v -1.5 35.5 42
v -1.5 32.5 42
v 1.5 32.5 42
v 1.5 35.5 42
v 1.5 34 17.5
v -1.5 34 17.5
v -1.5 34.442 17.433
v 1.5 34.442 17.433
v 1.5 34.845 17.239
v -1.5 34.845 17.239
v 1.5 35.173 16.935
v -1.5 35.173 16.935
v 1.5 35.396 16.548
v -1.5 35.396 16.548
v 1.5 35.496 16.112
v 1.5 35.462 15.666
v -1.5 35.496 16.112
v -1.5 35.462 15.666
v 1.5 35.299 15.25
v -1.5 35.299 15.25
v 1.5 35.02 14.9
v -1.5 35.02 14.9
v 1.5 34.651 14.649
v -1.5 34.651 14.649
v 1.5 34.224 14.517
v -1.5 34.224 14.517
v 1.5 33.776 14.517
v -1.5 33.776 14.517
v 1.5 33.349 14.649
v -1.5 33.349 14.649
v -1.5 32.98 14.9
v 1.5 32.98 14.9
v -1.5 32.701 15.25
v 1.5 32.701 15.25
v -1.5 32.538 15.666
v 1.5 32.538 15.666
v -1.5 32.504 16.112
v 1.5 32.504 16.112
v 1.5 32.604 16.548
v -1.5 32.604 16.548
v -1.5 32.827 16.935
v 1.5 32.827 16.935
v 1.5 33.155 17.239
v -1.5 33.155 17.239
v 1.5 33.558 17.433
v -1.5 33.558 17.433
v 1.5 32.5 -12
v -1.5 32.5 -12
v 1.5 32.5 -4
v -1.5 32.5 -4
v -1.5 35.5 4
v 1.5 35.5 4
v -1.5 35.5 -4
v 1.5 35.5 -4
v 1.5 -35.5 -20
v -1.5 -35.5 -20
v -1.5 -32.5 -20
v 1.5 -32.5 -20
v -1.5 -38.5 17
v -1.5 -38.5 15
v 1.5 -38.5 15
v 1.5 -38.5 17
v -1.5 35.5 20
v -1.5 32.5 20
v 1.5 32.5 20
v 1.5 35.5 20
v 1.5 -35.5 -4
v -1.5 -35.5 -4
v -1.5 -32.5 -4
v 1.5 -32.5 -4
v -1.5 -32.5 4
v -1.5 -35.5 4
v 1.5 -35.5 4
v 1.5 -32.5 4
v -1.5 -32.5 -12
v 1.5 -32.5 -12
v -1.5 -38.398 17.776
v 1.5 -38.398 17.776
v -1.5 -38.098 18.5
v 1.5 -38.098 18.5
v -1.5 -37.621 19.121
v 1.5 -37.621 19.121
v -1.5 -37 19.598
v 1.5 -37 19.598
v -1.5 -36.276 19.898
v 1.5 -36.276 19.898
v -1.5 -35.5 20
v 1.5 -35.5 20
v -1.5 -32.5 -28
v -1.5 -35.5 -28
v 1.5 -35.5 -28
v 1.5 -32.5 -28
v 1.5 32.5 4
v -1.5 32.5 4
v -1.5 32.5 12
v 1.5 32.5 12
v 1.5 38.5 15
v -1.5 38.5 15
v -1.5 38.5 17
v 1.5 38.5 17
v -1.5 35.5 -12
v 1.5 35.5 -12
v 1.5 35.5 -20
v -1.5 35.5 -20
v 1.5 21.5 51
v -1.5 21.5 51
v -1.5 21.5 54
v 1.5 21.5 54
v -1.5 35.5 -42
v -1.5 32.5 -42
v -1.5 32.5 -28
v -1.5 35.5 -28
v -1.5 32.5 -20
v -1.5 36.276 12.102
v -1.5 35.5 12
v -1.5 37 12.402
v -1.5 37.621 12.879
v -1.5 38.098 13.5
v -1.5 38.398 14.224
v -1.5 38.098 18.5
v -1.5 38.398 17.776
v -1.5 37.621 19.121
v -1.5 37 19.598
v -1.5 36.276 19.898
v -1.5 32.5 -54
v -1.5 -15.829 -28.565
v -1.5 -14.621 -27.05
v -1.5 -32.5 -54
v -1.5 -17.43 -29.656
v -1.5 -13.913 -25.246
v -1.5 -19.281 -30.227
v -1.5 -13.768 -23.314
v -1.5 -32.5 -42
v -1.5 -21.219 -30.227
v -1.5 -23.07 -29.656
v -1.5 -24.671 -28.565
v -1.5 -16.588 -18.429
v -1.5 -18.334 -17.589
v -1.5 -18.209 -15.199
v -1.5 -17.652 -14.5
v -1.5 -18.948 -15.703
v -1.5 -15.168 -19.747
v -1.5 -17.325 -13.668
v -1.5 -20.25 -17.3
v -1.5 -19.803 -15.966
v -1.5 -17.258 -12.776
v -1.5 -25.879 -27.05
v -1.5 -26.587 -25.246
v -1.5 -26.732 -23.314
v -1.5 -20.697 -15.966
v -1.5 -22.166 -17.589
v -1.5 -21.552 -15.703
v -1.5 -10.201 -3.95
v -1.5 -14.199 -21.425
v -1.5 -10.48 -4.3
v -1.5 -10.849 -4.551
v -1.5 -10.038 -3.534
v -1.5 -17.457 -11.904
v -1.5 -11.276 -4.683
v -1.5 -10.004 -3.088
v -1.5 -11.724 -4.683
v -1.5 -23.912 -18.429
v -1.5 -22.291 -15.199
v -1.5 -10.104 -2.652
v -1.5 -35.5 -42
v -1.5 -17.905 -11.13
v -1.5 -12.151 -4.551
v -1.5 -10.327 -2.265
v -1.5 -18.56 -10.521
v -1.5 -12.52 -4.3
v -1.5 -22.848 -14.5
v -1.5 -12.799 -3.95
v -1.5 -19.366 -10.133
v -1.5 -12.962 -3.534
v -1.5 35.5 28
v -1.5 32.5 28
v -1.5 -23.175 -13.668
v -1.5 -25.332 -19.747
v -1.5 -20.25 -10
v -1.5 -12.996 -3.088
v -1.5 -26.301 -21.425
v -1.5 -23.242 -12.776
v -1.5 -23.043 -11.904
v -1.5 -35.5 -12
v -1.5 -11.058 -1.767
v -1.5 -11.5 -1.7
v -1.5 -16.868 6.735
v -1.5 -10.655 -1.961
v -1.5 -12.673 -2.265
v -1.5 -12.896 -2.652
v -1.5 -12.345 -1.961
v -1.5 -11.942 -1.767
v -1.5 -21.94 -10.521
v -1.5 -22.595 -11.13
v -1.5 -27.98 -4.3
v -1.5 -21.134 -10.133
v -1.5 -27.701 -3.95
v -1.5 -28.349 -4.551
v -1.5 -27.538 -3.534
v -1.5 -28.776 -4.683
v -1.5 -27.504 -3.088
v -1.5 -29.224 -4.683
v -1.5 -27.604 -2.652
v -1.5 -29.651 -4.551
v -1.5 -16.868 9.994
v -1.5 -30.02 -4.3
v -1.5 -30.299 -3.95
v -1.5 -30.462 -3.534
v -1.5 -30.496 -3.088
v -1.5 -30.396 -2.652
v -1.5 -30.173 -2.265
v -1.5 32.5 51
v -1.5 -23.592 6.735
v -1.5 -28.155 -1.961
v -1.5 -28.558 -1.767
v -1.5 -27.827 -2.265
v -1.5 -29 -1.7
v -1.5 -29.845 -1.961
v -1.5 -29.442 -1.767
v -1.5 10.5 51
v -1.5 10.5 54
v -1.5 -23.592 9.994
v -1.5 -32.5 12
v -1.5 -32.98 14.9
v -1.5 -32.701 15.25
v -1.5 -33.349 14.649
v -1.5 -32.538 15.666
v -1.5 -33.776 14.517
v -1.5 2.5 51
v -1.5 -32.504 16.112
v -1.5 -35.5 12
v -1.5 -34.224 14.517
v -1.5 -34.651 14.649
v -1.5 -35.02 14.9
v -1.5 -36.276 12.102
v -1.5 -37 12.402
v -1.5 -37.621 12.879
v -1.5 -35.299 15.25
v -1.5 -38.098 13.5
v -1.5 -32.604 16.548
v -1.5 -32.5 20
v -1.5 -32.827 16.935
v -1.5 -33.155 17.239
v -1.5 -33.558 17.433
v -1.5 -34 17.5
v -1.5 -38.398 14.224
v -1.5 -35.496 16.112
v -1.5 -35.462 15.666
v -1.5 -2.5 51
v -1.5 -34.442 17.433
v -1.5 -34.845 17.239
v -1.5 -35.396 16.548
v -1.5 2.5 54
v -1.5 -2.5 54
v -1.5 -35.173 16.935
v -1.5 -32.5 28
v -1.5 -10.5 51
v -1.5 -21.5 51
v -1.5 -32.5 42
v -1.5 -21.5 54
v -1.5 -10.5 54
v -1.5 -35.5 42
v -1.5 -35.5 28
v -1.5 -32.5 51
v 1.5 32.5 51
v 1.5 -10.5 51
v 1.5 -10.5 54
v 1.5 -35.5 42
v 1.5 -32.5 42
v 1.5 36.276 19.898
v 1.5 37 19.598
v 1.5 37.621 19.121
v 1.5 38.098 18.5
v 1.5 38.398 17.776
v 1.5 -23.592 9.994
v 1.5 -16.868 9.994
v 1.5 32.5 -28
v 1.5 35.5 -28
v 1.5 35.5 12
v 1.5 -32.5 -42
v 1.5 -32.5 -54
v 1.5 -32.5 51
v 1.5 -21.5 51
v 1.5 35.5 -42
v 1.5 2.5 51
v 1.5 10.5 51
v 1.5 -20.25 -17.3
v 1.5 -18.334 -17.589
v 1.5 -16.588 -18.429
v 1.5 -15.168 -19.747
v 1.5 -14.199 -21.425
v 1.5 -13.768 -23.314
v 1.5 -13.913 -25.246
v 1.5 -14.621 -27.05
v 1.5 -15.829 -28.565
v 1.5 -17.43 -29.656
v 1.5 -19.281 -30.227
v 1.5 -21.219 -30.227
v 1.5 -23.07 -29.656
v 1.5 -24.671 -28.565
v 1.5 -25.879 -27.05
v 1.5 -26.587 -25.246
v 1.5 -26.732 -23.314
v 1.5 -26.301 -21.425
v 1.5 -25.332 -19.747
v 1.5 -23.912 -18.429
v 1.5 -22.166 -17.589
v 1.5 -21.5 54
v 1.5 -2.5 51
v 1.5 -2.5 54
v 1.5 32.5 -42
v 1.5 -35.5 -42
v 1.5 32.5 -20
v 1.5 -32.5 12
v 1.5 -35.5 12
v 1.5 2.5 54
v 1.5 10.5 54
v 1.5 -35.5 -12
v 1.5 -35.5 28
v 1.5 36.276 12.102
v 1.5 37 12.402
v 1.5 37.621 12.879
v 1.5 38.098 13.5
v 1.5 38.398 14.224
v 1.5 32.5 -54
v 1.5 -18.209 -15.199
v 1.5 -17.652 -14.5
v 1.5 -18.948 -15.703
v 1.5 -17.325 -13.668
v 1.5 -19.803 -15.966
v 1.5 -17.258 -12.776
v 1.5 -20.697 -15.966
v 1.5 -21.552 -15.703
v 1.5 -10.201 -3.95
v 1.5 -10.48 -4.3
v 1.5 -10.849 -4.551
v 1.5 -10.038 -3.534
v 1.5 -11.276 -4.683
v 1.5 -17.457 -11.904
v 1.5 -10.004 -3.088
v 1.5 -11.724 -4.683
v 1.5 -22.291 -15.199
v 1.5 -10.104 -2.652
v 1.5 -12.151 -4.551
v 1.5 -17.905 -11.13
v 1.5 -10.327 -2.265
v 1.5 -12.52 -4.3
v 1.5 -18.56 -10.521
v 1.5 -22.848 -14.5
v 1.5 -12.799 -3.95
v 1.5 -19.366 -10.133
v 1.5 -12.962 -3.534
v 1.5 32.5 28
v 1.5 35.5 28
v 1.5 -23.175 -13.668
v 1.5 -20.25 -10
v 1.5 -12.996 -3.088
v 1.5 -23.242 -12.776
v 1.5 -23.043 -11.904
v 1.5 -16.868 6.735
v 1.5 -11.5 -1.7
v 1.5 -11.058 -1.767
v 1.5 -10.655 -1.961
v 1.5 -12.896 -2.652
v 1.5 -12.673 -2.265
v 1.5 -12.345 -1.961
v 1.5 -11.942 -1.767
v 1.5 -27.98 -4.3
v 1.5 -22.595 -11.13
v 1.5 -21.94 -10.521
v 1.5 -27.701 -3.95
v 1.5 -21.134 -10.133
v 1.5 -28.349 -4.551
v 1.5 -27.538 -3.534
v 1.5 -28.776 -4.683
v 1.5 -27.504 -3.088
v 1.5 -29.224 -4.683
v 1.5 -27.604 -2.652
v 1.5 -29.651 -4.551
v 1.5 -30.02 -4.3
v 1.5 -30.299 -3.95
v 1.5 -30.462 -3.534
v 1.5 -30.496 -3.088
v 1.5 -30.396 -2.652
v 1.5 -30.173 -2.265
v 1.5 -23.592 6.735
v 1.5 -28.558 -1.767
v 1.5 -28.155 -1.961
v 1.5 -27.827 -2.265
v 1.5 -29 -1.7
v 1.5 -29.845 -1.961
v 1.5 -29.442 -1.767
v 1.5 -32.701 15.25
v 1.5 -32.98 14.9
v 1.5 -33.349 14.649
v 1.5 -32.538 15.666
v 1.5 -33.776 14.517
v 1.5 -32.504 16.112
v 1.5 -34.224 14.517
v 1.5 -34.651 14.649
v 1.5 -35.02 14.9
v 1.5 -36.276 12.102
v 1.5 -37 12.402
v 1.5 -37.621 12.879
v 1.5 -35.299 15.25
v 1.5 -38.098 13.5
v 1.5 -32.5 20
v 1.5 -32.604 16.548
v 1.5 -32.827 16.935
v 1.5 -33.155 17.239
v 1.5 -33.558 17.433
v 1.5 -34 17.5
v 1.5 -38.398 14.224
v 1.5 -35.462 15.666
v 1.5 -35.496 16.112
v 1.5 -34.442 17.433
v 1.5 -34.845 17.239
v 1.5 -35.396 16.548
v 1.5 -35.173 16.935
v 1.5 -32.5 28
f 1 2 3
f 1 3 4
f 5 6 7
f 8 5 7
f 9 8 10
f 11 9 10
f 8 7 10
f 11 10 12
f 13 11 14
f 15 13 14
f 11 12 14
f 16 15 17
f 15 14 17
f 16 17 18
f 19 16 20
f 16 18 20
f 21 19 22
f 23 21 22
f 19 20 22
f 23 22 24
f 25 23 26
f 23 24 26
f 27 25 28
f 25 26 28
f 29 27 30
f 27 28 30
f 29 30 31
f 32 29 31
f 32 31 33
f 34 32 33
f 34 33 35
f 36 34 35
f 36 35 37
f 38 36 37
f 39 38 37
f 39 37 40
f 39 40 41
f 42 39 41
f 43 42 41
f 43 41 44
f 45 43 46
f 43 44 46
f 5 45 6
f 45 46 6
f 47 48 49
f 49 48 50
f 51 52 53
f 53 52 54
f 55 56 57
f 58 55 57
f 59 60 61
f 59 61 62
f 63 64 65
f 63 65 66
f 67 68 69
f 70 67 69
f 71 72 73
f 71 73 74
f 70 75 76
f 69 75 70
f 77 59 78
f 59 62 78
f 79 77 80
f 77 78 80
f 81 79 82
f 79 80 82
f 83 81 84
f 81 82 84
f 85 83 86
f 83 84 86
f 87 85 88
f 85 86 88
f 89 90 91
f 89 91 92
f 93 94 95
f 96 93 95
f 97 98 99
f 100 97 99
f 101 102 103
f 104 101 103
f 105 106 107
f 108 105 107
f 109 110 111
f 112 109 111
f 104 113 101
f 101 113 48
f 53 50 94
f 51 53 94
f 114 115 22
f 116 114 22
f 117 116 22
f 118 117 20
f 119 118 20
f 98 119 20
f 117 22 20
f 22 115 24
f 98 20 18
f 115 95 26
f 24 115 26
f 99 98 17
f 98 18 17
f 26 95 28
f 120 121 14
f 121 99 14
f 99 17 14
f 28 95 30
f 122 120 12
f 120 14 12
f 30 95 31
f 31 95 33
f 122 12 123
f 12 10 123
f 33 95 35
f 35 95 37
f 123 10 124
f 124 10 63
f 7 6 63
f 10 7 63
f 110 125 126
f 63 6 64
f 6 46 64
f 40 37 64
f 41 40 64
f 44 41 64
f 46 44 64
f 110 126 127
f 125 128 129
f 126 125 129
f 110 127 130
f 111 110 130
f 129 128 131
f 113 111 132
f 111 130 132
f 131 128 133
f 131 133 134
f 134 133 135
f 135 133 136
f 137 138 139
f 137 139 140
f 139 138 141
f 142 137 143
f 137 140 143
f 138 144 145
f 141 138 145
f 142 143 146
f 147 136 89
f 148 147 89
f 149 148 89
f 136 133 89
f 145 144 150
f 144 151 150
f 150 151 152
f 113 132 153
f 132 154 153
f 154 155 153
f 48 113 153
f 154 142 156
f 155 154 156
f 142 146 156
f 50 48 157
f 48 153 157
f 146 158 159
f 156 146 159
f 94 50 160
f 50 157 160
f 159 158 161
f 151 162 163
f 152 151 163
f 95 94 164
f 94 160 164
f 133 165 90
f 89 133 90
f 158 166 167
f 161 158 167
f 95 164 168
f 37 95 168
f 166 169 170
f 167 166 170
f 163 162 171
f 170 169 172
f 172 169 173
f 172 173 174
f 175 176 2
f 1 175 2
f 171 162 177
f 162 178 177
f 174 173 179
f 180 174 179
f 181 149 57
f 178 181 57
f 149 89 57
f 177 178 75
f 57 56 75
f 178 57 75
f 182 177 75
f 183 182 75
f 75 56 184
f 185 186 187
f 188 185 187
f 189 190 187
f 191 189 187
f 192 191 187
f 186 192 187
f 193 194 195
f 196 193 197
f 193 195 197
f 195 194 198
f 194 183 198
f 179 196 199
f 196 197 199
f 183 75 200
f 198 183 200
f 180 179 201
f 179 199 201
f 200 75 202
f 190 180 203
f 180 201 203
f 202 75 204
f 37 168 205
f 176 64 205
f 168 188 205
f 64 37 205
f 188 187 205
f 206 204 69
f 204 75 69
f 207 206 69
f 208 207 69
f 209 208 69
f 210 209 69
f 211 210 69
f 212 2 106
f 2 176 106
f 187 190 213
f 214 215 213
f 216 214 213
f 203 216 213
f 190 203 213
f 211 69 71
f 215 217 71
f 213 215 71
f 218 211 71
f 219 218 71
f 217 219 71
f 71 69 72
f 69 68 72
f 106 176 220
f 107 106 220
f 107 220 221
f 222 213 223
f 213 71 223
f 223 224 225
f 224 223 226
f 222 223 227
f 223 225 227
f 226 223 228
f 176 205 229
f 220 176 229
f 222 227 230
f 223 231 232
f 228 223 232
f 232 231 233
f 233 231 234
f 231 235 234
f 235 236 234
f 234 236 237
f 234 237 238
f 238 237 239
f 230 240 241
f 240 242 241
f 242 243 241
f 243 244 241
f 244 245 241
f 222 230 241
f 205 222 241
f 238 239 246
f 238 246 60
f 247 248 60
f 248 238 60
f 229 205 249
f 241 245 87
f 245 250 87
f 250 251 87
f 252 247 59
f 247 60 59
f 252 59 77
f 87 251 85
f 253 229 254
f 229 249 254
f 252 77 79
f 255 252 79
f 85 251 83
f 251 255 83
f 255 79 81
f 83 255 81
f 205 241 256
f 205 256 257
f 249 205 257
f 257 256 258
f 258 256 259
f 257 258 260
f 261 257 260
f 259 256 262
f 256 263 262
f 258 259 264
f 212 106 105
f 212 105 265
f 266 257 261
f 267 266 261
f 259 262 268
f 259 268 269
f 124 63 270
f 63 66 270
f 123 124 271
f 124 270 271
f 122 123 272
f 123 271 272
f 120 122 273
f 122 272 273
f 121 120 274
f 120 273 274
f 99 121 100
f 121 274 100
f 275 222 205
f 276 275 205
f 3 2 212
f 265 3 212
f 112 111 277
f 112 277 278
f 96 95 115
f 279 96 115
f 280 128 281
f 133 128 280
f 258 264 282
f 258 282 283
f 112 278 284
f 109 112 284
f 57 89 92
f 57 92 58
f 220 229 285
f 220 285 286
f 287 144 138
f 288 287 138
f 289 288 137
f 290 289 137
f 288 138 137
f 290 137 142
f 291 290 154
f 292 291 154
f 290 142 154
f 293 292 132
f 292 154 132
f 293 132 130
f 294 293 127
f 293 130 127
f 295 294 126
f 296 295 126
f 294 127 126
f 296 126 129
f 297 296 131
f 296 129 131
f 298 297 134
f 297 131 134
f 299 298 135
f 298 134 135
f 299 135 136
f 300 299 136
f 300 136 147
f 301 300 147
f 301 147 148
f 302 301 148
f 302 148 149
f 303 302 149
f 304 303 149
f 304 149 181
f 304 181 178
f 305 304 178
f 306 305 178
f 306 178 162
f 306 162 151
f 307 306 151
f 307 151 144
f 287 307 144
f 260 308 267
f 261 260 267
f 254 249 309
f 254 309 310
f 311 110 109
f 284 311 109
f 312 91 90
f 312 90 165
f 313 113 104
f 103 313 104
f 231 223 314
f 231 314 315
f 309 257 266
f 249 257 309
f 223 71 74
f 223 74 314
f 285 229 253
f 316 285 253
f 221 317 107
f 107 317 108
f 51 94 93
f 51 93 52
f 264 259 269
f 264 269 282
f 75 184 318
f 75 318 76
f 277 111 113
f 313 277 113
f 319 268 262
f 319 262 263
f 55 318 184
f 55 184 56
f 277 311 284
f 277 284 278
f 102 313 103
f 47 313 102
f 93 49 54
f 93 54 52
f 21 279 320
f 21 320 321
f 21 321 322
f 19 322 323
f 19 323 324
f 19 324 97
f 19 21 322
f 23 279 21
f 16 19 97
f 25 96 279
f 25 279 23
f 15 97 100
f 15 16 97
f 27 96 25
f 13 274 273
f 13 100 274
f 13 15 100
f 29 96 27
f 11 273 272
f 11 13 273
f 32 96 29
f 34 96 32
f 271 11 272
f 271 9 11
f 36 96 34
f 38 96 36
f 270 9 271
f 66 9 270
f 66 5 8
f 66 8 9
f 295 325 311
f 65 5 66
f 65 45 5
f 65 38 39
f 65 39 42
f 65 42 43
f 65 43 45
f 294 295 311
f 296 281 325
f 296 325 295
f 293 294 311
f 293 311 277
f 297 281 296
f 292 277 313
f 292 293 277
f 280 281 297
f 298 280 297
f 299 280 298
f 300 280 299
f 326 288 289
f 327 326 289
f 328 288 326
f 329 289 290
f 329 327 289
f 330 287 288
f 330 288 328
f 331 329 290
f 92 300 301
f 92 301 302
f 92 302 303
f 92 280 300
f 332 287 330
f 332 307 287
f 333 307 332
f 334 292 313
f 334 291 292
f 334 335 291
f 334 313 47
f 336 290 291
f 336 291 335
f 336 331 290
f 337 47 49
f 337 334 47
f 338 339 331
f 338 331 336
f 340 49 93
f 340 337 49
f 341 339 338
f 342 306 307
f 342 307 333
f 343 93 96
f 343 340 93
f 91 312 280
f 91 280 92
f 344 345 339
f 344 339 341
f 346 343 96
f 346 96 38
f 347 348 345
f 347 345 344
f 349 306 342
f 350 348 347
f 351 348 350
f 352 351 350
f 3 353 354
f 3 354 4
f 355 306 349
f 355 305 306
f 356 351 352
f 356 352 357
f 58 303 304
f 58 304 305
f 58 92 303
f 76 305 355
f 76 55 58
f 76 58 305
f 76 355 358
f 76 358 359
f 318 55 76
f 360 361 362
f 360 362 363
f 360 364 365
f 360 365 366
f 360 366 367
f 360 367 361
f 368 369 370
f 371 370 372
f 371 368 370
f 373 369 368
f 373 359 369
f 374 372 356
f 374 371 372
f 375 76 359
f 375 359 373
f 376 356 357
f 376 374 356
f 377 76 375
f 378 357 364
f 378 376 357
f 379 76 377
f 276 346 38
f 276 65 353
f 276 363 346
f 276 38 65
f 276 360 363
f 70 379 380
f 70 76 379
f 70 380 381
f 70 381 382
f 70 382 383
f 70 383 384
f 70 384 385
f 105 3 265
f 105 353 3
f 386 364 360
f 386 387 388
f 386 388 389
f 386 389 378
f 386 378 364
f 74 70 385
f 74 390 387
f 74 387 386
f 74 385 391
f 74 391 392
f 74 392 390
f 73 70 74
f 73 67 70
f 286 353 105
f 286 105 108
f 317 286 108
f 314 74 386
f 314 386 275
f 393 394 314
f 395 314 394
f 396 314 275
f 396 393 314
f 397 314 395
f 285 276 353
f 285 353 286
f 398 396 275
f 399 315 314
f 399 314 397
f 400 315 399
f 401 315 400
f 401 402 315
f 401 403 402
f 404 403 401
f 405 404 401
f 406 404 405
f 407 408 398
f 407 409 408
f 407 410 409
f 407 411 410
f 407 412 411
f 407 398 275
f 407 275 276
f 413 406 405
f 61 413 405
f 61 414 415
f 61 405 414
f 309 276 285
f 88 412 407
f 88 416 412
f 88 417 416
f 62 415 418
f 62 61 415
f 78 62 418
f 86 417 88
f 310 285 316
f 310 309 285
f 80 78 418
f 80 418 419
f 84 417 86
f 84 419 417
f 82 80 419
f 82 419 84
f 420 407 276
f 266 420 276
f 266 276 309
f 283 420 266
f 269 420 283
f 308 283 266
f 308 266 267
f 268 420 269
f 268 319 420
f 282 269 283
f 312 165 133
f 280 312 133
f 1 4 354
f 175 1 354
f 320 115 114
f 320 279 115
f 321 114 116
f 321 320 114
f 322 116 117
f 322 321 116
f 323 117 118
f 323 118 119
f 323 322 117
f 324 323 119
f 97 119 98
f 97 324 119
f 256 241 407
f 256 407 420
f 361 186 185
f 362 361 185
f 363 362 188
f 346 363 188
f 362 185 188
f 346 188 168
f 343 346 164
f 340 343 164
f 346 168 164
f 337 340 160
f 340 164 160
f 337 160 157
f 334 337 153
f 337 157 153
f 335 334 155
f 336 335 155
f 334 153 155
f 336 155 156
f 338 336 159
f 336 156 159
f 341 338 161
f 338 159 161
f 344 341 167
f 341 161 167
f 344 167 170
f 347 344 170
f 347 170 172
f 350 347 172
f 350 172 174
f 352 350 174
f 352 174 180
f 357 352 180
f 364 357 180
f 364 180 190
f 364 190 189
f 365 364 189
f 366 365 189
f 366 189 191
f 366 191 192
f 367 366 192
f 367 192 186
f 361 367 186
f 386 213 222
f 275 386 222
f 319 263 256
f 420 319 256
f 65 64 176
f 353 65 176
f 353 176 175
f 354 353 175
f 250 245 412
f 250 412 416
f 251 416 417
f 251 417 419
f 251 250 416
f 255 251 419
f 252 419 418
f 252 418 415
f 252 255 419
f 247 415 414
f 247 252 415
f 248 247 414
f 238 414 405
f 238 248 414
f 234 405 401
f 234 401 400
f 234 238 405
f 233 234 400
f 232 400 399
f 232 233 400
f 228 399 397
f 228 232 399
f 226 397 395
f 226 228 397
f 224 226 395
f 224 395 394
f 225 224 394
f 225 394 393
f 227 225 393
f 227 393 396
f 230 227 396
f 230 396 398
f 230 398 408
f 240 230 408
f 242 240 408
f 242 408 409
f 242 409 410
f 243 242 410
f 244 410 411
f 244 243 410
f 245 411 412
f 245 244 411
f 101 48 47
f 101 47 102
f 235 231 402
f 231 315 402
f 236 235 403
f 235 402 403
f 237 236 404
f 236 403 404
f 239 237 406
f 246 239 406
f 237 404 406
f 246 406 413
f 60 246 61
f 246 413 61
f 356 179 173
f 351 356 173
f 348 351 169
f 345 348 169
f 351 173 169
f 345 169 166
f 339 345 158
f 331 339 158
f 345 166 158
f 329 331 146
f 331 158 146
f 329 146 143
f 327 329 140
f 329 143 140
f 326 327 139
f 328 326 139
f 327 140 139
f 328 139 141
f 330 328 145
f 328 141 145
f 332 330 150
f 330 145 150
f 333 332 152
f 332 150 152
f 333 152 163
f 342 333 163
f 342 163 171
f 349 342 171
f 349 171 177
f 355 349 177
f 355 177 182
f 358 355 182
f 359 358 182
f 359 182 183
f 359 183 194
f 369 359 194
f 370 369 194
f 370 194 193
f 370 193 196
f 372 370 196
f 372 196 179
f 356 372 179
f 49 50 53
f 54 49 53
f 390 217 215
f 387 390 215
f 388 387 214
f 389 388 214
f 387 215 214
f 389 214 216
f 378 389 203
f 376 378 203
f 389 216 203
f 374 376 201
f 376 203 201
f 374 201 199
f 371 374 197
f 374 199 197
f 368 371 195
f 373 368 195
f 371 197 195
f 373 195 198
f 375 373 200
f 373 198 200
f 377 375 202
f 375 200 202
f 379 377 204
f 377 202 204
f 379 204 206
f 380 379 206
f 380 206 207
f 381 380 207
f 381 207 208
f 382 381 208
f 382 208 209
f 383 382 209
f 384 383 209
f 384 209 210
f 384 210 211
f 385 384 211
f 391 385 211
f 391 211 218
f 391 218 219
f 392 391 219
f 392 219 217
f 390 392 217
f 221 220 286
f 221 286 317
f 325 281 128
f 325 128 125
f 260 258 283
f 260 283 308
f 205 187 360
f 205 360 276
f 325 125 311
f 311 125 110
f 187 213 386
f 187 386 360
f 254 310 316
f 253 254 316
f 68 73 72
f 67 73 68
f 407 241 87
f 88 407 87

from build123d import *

# Parameters (mm, degrees)
CROQUIS1_W               = 108
CROQUIS1_H               = 71
SALIENTE_EXTRUIR1_DEPTH  = 1.5
CROQUIS2_W               = 12
CROQUIS2_H               = 3
CROQUIS2_W_2             = 8
CORTAR_EXTRUIR1_DEPTH    = 3
CROQUIS6_W               = 3
CROQUIS6_H               = 14
CROQUIS6_H_2             = 8
CORTAR_EXTRUIR3_DEPTH    = 3
CROQUIS7_R               = 1.5
CROQUIS7_R_2             = 3
CROQUIS7_R_3             = 6.5
CROQUIS7_W               = 3.259373519
CROQUIS7_H               = 6.723882433
CORTAR_EXTRUIR4_DEPTH    = 23
CROQUIS8_W               = 8
CROQUIS8_H               = 3
SALIENTE_EXTRUIR2_DEPTH  = 3
REDONDEO2_R              = 3
CROQUIS9_R               = 1.5
CORTAR_EXTRUIR5_DEPTH    = 3
REDONDEO2_OF_SIMETR_A1_R = 3


with BuildPart() as part:
    # Croquis1 → Saliente-Extruir1 (new, symmetric)
    with BuildSketch(Plane(origin=(0, 0, 0), x_dir=(0, 0, -1), z_dir=(1, 0, 0))):
        Rectangle(CROQUIS1_W, CROQUIS1_H)
    extrude(amount=SALIENTE_EXTRUIR1_DEPTH, both=True)

    # Croquis2 → Cortar-Extruir1 (cut)
    with BuildSketch(Plane.ZY.offset(1.5)):
        with Locations((-48, -34)):
            Rectangle(CROQUIS2_W, CROQUIS2_H)
        with Locations((-24, -34)):
            Rectangle(CROQUIS2_W_2, CROQUIS2_H)
        with Locations((-8, -34)):
            Rectangle(CROQUIS2_W_2, CROQUIS2_H)
        with Locations((8, -34)):
            Rectangle(CROQUIS2_W_2, CROQUIS2_H)
        with Locations((24, -34)):
            Rectangle(CROQUIS2_W_2, CROQUIS2_H)
        with Locations((48, -34)):
            Rectangle(CROQUIS2_W, CROQUIS2_H)
        with Locations((48, 34)):
            Rectangle(CROQUIS2_W, CROQUIS2_H)
        with Locations((24, 34)):
            Rectangle(CROQUIS2_W_2, CROQUIS2_H)
        with Locations((8, 34)):
            Rectangle(CROQUIS2_W_2, CROQUIS2_H)
        with Locations((-8, 34)):
            Rectangle(CROQUIS2_W_2, CROQUIS2_H)
        with Locations((-24, 34)):
            Rectangle(CROQUIS2_W_2, CROQUIS2_H)
        with Locations((-48, 34)):
            Rectangle(CROQUIS2_W, CROQUIS2_H)
    extrude(amount=-CORTAR_EXTRUIR1_DEPTH, mode=Mode.SUBTRACT)

    # Croquis6 → Cortar-Extruir3 (cut)
    with BuildSketch(Plane.ZY.offset(1.5)):
        with Locations((52.5, -28.5)):
            Rectangle(CROQUIS6_W, CROQUIS6_H)
        with Locations((52.5, -6.5)):
            Rectangle(CROQUIS6_W, CROQUIS6_H_2)
        with Locations((52.5, 6.5)):
            Rectangle(CROQUIS6_W, CROQUIS6_H_2)
        with Locations((52.5, 28.5)):
            Rectangle(CROQUIS6_W, CROQUIS6_H)
    extrude(amount=-CORTAR_EXTRUIR3_DEPTH, mode=Mode.SUBTRACT)

    # Croquis7 → Cortar-Extruir4 (cut)
    with BuildSketch(Plane.ZY.offset(1.5)):
        with Locations((-3.2, -11.5)):
            Circle(CROQUIS7_R)
        with Locations((-3.2, -29)):
            Circle(CROQUIS7_R)
        with Locations((-13, -20.25)):
            Circle(CROQUIS7_R_2)
        with Locations((-23.8, -20.25)):
            Circle(CROQUIS7_R_3)
        with Locations((8.36450747, -20.229697644)):
            Rectangle(CROQUIS7_W, CROQUIS7_H)
    extrude(amount=-CORTAR_EXTRUIR4_DEPTH, mode=Mode.SUBTRACT)

    # Croquis8 → Saliente-Extruir2 (add)
    with BuildSketch(Plane.ZY.offset(1.5)):
        with Locations((16, 37)):
            Rectangle(CROQUIS8_W, CROQUIS8_H)
    saliente_extruir2 = extrude(amount=-SALIENTE_EXTRUIR2_DEPTH)

    # Redondeo2
    redondeo2_edges = [part.edges().sort_by_distance(p)[0] for p in [
        (0, 38.5, 12),
        (0, 38.5, 20),
    ]]
    fillet(redondeo2_edges, radius=REDONDEO2_R)

    # Croquis9 → Cortar-Extruir5 (cut)
    with BuildSketch(Plane.ZY.offset(1.5)):
        with Locations((16, 34)):
            Circle(CROQUIS9_R)
    cortar_extruir5 = extrude(amount=-CORTAR_EXTRUIR5_DEPTH, mode=Mode.SUBTRACT)

    # Simetría1: Saliente-Extruir2, Cortar-Extruir5 across plane
    add(saliente_extruir2.mirror(Plane.ZX))
    add(cortar_extruir5.mirror(Plane.ZX), mode=Mode.SUBTRACT)

    # Redondeo2 of Simetría1
    redondeo2_of_simetr_a1_edges = [part.edges().sort_by_distance(p)[0] for p in [
        (0, -38.5, 12),
        (0, -38.5, 20),
    ]]
    fillet(redondeo2_of_simetr_a1_edges, radius=REDONDEO2_OF_SIMETR_A1_R)


solid = part.part
